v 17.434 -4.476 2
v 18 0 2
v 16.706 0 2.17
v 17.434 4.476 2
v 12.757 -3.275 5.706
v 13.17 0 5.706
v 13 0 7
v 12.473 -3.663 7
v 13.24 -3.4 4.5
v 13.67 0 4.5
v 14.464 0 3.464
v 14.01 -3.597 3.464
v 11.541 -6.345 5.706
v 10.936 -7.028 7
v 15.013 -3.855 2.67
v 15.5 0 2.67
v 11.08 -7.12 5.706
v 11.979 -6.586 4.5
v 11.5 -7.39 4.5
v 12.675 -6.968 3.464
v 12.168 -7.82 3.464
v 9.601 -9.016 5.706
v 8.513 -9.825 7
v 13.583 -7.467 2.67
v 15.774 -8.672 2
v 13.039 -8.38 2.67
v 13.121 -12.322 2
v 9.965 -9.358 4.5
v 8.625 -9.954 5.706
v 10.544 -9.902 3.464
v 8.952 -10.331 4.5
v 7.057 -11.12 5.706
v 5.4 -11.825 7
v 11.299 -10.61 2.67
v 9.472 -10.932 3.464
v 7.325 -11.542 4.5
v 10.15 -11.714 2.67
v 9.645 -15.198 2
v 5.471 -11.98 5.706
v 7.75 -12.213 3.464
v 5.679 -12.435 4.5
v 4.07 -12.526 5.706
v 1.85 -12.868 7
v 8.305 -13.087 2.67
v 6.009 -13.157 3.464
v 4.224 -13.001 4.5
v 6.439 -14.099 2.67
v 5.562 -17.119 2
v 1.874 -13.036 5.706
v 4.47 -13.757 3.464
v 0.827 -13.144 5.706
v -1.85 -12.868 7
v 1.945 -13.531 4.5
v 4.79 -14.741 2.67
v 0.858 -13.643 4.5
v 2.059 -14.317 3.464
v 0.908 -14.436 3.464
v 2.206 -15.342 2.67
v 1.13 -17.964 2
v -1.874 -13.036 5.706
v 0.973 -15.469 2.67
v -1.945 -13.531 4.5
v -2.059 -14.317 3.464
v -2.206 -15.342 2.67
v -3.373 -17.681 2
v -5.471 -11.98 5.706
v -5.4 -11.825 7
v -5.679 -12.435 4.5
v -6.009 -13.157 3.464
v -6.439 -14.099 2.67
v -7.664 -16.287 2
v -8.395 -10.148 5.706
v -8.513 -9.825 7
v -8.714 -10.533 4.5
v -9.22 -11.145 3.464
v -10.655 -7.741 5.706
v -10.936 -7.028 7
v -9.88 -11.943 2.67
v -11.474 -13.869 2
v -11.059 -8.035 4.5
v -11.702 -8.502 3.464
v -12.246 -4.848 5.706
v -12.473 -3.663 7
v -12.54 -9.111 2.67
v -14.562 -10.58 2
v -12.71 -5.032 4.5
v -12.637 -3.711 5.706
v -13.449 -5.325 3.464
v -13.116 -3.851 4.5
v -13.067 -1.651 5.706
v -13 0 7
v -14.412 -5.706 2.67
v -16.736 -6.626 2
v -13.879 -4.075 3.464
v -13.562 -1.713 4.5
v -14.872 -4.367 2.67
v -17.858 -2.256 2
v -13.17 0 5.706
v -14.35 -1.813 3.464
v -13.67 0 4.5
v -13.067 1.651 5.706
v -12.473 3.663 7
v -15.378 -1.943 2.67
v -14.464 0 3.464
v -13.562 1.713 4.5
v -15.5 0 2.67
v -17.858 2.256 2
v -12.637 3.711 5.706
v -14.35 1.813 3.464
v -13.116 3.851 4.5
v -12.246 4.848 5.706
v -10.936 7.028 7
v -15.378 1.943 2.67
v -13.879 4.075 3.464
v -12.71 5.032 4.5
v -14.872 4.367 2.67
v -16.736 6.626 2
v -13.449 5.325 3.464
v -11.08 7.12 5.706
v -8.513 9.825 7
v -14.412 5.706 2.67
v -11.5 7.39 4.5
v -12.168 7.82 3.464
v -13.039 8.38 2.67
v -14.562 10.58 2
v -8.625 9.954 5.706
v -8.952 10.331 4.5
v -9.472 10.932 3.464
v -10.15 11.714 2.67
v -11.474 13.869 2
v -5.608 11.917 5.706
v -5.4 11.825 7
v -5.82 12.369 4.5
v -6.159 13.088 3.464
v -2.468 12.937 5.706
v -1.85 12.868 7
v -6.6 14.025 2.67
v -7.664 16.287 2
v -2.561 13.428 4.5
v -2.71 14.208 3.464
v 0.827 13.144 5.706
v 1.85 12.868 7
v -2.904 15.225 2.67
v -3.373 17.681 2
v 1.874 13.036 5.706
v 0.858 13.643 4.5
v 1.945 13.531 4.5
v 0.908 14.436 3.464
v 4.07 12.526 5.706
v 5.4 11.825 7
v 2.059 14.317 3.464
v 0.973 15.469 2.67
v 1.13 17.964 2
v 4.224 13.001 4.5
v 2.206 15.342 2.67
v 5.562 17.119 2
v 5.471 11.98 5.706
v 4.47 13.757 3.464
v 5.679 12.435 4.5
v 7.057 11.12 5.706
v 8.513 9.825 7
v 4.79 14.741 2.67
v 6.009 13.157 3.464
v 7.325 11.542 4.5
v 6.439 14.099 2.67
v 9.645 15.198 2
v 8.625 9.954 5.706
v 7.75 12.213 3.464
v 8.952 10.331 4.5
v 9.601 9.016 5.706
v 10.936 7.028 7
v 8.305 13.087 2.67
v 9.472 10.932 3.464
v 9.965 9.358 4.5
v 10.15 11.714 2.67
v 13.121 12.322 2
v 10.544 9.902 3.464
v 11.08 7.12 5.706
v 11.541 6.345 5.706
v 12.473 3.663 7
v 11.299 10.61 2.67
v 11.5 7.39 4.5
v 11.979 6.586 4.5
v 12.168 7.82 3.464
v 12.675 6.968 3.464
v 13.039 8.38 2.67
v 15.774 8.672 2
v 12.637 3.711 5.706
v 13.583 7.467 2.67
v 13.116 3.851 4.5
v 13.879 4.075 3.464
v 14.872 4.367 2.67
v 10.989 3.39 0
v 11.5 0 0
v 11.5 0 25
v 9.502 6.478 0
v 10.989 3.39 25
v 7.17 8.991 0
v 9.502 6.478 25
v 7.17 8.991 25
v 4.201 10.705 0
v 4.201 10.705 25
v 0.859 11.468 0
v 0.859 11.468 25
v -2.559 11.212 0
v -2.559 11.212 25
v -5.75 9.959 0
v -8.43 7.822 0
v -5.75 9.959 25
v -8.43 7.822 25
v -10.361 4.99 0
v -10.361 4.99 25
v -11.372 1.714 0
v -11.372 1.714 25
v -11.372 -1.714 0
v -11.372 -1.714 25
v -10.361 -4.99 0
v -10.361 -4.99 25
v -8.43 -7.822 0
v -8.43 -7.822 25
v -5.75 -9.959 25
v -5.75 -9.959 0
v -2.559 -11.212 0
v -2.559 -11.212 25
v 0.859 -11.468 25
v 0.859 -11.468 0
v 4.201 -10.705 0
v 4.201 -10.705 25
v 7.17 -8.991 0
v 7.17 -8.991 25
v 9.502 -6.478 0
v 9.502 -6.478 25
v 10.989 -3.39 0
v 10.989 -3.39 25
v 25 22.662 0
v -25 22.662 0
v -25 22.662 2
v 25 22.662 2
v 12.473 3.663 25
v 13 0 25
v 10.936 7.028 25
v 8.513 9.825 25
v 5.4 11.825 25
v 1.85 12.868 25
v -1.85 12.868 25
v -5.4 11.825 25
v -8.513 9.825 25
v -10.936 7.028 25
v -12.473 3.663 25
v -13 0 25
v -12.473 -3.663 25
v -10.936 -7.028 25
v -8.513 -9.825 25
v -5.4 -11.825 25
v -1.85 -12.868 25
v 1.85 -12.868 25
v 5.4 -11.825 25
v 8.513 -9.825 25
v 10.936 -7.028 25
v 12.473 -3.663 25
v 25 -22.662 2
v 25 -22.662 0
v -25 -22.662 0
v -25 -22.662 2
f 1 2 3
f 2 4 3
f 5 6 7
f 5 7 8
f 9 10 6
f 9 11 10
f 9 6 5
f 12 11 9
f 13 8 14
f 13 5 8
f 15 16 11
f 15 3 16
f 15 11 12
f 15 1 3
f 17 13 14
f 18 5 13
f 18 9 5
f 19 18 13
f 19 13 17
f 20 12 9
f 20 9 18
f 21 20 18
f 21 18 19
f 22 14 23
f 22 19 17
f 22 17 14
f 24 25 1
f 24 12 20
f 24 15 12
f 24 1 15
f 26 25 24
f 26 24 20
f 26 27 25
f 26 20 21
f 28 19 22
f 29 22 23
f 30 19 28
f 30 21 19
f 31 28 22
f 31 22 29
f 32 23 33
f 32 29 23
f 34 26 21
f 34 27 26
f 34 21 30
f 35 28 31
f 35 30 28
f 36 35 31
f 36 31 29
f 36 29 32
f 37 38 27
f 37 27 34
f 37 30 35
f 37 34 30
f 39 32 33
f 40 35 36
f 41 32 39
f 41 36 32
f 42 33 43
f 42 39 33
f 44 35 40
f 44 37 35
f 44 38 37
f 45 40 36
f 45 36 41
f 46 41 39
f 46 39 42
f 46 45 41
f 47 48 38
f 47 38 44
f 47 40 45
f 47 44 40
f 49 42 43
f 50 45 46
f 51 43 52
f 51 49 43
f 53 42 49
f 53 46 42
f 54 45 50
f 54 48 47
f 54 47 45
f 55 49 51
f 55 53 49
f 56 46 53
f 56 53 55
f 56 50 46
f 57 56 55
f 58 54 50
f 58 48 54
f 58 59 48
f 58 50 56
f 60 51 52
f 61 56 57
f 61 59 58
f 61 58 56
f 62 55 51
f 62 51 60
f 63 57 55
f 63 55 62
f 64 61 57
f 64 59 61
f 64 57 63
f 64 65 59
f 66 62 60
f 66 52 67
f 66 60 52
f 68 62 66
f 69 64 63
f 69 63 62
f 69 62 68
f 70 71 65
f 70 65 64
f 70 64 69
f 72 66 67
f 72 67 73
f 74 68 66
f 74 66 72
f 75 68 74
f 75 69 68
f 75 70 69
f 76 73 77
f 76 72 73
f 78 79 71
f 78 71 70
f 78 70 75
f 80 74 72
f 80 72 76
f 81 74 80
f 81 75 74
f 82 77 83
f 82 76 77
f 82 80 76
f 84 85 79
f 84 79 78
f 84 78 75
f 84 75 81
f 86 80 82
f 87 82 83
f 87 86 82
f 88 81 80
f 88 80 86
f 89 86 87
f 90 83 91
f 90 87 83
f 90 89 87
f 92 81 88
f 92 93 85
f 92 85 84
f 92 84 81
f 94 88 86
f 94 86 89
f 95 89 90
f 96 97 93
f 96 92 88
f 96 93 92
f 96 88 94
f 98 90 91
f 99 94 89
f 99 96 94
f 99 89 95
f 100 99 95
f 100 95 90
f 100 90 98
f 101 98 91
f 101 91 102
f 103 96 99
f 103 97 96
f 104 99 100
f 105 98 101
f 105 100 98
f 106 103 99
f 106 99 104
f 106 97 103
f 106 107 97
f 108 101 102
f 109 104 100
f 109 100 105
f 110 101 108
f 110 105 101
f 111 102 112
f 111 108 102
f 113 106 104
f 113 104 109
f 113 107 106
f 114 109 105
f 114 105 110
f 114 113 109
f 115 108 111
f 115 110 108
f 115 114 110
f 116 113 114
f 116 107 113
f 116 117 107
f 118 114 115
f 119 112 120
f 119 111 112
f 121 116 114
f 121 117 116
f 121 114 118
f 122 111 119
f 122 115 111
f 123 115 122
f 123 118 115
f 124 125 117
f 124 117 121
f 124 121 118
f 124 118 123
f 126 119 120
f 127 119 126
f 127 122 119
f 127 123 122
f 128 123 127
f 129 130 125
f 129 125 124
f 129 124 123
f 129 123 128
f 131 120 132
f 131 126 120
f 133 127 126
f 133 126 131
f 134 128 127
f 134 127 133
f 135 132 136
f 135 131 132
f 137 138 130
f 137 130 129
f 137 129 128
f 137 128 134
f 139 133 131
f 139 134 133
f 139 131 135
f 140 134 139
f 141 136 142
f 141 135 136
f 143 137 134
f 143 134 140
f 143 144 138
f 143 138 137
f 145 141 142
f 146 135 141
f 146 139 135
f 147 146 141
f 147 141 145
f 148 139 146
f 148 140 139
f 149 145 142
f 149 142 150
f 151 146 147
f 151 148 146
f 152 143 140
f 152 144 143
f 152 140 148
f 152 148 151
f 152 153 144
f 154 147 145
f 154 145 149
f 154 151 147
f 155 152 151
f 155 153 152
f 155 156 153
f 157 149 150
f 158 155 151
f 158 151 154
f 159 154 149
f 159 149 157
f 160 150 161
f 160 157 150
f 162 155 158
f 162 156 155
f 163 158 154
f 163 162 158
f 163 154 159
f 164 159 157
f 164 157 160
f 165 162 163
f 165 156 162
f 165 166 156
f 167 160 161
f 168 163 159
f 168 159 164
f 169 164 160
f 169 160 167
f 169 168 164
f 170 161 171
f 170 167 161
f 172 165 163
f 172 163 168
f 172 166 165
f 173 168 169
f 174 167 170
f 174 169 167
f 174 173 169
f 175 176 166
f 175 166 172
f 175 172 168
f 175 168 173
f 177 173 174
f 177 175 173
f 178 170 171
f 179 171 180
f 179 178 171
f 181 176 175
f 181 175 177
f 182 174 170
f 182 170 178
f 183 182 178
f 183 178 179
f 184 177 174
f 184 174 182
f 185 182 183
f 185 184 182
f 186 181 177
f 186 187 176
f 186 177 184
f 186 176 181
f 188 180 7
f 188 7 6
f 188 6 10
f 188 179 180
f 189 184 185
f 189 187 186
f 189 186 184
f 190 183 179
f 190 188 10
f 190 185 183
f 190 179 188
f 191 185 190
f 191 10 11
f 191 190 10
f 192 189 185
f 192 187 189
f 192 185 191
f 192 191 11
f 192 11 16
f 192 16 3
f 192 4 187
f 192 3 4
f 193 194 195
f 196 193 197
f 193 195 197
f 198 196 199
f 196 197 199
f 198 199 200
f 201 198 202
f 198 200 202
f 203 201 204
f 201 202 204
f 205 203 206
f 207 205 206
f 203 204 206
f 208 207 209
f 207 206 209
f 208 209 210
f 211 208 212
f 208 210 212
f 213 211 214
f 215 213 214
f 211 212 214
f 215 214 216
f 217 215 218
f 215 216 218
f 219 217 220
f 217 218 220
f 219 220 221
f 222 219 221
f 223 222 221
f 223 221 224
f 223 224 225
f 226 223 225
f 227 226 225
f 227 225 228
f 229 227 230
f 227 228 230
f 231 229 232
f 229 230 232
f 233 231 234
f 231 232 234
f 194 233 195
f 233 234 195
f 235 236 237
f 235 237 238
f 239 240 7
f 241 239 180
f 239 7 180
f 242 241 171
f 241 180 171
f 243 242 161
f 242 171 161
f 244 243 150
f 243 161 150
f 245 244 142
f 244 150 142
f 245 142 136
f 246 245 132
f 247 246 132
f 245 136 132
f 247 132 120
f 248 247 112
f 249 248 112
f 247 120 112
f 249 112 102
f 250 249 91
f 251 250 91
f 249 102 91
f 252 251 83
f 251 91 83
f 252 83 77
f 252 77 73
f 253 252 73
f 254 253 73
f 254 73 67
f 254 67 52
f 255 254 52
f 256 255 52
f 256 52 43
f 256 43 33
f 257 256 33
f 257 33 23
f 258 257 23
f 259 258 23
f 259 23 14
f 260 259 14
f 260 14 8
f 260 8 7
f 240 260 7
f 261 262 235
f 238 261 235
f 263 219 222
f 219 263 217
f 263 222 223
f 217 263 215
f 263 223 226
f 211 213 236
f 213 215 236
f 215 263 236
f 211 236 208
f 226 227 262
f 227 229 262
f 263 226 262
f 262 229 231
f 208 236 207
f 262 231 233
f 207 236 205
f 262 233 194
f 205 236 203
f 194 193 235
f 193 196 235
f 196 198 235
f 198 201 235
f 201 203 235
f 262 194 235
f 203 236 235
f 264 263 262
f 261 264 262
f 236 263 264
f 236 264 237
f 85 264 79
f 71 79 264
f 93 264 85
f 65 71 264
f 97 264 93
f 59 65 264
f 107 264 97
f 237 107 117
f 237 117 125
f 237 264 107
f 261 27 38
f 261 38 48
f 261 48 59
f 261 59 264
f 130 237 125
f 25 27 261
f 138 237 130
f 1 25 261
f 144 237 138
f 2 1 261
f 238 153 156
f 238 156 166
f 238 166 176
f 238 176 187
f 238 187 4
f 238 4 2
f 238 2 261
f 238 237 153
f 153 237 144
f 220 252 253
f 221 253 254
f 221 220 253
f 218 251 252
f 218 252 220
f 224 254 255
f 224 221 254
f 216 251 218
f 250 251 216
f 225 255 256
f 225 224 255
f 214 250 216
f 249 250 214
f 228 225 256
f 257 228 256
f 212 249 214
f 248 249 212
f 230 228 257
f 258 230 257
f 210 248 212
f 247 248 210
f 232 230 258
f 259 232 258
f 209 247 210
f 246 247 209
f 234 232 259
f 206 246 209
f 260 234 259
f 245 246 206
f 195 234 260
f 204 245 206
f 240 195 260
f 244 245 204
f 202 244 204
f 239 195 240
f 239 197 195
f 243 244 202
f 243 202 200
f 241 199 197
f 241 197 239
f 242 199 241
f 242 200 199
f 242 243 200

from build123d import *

# Parameters (mm, degrees)
F1_W      = 50
F1_H      = 45.323998
F2_DEPTH  = 2
F0_R      = 13
F0_R_2    = 11.5
F3_DEPTH  = 25
F3_FACE_R = 11.5
F4_DEPTH  = 25
F5_R      = 5


with BuildPart() as f2:
    # F1 (on Top) → F2 (new body)
    with BuildSketch(Plane.XY):
        Rectangle(F1_W, F1_H)
    extrude(amount=F2_DEPTH)

    # F0 (on Top) → F3 (join)
    with BuildSketch(Plane.XY):
        Circle(F0_R)
        Circle(F0_R_2, mode=Mode.SUBTRACT)
    extrude(amount=F3_DEPTH)

    # F3_face (on face) → F4 (cut)
    with BuildSketch(Plane.XY.offset(2)):
        Circle(F3_FACE_R)
    extrude(amount=-F4_DEPTH, mode=Mode.SUBTRACT)

    # F5
    f5_edges = [f2.edges().sort_by_distance(p)[0] for p in [
        (-13, 0, 2),
    ]]
    fillet(f5_edges, radius=F5_R)


solid = f2.part
